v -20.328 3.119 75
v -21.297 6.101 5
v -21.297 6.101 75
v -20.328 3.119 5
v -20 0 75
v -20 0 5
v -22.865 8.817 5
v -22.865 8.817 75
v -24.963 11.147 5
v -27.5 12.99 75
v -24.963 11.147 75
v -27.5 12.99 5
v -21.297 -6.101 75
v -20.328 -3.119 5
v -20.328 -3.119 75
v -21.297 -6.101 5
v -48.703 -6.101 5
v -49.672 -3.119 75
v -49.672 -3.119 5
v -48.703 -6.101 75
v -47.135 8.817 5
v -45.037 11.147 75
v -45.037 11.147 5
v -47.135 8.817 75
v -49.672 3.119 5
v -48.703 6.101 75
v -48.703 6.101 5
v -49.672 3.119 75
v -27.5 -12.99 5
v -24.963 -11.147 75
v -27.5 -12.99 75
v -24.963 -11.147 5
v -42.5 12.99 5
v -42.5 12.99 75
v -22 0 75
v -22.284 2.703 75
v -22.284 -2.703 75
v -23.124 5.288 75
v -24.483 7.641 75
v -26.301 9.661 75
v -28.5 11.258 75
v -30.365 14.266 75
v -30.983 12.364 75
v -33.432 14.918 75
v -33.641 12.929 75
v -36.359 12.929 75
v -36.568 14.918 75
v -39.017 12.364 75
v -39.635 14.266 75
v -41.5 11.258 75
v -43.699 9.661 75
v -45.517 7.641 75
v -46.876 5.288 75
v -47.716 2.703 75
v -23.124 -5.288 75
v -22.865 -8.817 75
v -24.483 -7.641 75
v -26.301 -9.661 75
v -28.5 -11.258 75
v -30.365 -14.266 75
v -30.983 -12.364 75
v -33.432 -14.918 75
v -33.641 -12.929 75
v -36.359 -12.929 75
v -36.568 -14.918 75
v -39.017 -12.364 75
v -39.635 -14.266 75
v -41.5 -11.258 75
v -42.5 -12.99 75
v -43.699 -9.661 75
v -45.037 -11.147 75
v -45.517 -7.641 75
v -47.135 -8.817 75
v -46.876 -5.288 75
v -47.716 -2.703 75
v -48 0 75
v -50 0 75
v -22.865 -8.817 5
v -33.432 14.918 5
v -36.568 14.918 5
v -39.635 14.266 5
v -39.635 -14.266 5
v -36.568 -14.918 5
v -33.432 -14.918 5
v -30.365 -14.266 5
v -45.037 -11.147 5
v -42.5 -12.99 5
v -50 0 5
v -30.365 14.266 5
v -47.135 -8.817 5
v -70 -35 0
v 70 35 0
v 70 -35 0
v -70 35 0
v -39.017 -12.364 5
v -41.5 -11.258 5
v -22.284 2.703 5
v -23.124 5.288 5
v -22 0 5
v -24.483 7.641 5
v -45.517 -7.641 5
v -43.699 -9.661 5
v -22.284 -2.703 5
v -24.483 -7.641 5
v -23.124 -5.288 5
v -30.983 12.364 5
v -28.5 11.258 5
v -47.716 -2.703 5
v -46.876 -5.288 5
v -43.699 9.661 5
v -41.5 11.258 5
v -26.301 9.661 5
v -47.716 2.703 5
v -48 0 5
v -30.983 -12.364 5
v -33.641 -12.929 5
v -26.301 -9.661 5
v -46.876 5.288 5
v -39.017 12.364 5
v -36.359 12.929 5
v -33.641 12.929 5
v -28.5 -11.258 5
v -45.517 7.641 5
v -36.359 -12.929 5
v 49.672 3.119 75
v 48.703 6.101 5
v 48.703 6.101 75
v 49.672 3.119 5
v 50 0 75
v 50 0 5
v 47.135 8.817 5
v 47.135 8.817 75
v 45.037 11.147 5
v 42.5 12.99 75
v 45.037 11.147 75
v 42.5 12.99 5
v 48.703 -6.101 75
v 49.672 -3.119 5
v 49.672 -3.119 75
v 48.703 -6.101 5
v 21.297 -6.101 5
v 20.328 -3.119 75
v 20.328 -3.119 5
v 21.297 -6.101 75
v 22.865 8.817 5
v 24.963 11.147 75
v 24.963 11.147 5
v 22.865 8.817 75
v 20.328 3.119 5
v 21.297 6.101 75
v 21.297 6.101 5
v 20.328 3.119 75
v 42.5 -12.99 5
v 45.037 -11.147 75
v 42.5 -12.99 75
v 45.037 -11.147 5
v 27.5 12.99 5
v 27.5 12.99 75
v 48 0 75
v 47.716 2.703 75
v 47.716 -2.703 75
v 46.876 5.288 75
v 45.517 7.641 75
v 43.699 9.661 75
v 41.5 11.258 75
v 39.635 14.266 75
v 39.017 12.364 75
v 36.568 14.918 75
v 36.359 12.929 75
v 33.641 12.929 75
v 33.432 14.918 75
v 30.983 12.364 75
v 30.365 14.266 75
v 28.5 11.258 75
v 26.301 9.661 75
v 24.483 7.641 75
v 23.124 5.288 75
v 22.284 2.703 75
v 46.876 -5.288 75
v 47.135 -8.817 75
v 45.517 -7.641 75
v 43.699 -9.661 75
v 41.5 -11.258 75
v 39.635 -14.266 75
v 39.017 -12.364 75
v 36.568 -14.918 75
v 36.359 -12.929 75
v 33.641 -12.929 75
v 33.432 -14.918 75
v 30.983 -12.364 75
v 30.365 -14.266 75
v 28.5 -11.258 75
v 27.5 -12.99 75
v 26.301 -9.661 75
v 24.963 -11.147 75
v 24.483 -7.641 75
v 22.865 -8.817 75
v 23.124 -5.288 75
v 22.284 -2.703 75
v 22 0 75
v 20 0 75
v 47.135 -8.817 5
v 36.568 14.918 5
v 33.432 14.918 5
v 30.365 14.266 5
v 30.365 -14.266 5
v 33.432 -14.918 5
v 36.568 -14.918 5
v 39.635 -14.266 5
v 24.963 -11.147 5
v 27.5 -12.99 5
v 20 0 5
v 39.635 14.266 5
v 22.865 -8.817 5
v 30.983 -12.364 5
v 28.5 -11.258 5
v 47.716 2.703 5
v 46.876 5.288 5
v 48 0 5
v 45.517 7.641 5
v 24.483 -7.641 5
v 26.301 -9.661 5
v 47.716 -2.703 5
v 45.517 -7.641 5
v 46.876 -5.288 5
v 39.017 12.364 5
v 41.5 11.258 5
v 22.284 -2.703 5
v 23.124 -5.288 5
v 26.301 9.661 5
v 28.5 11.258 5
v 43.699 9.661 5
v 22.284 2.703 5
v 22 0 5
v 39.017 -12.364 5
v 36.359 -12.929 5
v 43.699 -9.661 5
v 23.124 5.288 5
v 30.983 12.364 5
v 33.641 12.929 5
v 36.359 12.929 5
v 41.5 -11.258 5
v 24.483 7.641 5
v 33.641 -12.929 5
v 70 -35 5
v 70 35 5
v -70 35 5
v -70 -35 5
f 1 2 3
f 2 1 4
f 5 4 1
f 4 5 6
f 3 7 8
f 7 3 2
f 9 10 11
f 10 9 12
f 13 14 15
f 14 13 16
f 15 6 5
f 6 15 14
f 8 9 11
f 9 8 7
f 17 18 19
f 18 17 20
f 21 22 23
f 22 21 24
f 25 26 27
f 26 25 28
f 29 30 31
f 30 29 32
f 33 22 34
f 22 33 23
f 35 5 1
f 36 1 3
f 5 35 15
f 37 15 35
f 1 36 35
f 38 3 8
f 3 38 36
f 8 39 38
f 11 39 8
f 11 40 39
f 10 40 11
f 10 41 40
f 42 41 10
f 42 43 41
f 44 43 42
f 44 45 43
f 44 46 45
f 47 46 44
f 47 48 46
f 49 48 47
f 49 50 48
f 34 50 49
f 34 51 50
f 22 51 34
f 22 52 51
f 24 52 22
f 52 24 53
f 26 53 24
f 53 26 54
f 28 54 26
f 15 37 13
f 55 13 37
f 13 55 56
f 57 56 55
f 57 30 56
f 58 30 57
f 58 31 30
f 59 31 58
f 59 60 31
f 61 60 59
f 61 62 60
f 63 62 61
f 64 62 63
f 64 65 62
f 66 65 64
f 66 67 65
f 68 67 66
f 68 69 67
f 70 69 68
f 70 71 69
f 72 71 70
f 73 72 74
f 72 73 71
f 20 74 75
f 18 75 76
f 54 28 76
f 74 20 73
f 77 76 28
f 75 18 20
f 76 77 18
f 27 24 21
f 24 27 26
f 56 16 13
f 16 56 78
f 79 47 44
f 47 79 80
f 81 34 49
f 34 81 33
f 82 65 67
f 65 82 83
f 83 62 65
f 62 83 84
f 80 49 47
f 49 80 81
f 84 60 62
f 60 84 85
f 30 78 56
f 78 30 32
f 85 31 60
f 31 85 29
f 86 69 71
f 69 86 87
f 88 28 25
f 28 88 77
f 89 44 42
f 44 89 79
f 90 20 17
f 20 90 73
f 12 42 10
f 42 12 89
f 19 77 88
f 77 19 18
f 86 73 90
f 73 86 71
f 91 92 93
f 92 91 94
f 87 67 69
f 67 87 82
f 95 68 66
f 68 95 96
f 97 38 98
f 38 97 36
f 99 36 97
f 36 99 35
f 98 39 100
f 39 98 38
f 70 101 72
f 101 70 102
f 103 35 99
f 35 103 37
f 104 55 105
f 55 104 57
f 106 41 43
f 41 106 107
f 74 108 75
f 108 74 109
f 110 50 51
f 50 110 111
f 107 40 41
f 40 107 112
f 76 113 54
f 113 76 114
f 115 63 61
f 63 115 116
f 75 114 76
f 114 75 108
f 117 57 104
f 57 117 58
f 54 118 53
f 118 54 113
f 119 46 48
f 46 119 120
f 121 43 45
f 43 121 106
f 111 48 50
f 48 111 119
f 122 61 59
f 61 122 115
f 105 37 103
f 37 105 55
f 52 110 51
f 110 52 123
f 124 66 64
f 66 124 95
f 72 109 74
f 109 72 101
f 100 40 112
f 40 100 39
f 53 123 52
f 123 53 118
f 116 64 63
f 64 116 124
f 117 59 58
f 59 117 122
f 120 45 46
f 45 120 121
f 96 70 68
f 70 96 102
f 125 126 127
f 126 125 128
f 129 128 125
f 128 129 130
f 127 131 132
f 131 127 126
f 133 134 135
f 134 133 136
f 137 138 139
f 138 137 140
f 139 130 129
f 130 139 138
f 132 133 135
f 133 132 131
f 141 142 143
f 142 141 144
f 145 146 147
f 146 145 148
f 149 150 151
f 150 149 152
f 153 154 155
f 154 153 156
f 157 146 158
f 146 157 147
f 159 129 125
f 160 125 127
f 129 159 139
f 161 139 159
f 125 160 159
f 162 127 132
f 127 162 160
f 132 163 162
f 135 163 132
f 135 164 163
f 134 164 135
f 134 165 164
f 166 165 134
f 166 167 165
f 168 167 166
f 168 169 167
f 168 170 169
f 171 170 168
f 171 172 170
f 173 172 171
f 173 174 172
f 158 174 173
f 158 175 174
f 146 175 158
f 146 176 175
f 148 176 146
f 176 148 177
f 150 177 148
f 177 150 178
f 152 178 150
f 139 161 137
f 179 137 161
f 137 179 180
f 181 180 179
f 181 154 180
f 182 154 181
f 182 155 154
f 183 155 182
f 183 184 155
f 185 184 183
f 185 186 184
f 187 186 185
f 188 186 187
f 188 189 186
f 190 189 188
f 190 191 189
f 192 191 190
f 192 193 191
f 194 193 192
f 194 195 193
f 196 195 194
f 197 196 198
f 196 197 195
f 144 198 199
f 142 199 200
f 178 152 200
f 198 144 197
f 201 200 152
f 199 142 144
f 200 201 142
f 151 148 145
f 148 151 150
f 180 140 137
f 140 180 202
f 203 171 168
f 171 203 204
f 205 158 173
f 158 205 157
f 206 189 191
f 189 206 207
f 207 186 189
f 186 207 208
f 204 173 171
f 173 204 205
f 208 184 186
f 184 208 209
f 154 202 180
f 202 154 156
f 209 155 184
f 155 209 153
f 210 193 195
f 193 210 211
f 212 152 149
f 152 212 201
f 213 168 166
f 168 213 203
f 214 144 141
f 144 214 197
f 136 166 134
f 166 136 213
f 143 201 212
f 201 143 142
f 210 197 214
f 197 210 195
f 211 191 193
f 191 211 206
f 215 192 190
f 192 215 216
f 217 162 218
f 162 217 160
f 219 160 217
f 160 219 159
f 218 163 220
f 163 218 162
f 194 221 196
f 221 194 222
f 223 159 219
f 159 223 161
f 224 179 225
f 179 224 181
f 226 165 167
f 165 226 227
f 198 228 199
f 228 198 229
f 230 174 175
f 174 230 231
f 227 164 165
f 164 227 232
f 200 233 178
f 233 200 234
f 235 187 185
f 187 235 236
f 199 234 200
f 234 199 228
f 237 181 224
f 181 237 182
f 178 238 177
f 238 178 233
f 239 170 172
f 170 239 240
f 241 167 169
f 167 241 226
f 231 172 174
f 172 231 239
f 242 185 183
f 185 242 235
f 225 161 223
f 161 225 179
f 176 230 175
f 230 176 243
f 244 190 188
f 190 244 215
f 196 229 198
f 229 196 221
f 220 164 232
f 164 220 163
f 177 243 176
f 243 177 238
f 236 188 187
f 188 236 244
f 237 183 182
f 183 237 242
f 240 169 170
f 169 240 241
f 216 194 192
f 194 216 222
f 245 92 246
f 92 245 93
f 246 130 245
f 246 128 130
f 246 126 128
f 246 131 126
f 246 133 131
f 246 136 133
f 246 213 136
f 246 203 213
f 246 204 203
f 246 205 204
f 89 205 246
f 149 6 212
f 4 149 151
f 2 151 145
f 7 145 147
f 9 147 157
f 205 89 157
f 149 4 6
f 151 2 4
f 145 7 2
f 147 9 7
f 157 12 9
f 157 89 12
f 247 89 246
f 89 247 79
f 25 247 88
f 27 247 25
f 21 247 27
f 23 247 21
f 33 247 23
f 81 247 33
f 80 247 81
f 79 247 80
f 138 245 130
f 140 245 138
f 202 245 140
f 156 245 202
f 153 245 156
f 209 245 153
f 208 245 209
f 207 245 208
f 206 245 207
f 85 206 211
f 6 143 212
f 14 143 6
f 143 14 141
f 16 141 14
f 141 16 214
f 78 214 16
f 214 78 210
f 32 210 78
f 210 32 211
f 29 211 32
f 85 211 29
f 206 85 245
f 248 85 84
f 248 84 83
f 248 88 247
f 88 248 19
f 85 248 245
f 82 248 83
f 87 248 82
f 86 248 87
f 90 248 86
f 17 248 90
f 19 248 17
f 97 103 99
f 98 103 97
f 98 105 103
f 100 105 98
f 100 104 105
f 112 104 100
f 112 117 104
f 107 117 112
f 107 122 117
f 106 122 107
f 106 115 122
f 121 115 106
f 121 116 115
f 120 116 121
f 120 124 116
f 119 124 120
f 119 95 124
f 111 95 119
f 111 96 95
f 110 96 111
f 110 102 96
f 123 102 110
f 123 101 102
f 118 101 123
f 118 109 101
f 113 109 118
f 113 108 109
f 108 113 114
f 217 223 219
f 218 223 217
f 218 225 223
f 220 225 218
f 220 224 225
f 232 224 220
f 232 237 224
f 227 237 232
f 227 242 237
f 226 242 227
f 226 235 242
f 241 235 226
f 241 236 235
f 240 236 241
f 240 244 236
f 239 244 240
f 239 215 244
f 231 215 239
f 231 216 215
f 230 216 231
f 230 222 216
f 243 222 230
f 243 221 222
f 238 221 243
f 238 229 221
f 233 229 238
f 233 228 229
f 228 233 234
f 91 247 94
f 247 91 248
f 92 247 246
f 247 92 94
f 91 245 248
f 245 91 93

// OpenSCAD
translate([-70,-35,0])
union() {
    cube([140,70,5]);
    translate([35,35]) {
        difference() {
            cylinder(h=75,r=15);
            cylinder(h=75,r=13);
        }
    }
    translate([105,35]) {
        difference() {
            cylinder(h=75,r=15);
            cylinder(h=75,r=13);
        }
    }
}
